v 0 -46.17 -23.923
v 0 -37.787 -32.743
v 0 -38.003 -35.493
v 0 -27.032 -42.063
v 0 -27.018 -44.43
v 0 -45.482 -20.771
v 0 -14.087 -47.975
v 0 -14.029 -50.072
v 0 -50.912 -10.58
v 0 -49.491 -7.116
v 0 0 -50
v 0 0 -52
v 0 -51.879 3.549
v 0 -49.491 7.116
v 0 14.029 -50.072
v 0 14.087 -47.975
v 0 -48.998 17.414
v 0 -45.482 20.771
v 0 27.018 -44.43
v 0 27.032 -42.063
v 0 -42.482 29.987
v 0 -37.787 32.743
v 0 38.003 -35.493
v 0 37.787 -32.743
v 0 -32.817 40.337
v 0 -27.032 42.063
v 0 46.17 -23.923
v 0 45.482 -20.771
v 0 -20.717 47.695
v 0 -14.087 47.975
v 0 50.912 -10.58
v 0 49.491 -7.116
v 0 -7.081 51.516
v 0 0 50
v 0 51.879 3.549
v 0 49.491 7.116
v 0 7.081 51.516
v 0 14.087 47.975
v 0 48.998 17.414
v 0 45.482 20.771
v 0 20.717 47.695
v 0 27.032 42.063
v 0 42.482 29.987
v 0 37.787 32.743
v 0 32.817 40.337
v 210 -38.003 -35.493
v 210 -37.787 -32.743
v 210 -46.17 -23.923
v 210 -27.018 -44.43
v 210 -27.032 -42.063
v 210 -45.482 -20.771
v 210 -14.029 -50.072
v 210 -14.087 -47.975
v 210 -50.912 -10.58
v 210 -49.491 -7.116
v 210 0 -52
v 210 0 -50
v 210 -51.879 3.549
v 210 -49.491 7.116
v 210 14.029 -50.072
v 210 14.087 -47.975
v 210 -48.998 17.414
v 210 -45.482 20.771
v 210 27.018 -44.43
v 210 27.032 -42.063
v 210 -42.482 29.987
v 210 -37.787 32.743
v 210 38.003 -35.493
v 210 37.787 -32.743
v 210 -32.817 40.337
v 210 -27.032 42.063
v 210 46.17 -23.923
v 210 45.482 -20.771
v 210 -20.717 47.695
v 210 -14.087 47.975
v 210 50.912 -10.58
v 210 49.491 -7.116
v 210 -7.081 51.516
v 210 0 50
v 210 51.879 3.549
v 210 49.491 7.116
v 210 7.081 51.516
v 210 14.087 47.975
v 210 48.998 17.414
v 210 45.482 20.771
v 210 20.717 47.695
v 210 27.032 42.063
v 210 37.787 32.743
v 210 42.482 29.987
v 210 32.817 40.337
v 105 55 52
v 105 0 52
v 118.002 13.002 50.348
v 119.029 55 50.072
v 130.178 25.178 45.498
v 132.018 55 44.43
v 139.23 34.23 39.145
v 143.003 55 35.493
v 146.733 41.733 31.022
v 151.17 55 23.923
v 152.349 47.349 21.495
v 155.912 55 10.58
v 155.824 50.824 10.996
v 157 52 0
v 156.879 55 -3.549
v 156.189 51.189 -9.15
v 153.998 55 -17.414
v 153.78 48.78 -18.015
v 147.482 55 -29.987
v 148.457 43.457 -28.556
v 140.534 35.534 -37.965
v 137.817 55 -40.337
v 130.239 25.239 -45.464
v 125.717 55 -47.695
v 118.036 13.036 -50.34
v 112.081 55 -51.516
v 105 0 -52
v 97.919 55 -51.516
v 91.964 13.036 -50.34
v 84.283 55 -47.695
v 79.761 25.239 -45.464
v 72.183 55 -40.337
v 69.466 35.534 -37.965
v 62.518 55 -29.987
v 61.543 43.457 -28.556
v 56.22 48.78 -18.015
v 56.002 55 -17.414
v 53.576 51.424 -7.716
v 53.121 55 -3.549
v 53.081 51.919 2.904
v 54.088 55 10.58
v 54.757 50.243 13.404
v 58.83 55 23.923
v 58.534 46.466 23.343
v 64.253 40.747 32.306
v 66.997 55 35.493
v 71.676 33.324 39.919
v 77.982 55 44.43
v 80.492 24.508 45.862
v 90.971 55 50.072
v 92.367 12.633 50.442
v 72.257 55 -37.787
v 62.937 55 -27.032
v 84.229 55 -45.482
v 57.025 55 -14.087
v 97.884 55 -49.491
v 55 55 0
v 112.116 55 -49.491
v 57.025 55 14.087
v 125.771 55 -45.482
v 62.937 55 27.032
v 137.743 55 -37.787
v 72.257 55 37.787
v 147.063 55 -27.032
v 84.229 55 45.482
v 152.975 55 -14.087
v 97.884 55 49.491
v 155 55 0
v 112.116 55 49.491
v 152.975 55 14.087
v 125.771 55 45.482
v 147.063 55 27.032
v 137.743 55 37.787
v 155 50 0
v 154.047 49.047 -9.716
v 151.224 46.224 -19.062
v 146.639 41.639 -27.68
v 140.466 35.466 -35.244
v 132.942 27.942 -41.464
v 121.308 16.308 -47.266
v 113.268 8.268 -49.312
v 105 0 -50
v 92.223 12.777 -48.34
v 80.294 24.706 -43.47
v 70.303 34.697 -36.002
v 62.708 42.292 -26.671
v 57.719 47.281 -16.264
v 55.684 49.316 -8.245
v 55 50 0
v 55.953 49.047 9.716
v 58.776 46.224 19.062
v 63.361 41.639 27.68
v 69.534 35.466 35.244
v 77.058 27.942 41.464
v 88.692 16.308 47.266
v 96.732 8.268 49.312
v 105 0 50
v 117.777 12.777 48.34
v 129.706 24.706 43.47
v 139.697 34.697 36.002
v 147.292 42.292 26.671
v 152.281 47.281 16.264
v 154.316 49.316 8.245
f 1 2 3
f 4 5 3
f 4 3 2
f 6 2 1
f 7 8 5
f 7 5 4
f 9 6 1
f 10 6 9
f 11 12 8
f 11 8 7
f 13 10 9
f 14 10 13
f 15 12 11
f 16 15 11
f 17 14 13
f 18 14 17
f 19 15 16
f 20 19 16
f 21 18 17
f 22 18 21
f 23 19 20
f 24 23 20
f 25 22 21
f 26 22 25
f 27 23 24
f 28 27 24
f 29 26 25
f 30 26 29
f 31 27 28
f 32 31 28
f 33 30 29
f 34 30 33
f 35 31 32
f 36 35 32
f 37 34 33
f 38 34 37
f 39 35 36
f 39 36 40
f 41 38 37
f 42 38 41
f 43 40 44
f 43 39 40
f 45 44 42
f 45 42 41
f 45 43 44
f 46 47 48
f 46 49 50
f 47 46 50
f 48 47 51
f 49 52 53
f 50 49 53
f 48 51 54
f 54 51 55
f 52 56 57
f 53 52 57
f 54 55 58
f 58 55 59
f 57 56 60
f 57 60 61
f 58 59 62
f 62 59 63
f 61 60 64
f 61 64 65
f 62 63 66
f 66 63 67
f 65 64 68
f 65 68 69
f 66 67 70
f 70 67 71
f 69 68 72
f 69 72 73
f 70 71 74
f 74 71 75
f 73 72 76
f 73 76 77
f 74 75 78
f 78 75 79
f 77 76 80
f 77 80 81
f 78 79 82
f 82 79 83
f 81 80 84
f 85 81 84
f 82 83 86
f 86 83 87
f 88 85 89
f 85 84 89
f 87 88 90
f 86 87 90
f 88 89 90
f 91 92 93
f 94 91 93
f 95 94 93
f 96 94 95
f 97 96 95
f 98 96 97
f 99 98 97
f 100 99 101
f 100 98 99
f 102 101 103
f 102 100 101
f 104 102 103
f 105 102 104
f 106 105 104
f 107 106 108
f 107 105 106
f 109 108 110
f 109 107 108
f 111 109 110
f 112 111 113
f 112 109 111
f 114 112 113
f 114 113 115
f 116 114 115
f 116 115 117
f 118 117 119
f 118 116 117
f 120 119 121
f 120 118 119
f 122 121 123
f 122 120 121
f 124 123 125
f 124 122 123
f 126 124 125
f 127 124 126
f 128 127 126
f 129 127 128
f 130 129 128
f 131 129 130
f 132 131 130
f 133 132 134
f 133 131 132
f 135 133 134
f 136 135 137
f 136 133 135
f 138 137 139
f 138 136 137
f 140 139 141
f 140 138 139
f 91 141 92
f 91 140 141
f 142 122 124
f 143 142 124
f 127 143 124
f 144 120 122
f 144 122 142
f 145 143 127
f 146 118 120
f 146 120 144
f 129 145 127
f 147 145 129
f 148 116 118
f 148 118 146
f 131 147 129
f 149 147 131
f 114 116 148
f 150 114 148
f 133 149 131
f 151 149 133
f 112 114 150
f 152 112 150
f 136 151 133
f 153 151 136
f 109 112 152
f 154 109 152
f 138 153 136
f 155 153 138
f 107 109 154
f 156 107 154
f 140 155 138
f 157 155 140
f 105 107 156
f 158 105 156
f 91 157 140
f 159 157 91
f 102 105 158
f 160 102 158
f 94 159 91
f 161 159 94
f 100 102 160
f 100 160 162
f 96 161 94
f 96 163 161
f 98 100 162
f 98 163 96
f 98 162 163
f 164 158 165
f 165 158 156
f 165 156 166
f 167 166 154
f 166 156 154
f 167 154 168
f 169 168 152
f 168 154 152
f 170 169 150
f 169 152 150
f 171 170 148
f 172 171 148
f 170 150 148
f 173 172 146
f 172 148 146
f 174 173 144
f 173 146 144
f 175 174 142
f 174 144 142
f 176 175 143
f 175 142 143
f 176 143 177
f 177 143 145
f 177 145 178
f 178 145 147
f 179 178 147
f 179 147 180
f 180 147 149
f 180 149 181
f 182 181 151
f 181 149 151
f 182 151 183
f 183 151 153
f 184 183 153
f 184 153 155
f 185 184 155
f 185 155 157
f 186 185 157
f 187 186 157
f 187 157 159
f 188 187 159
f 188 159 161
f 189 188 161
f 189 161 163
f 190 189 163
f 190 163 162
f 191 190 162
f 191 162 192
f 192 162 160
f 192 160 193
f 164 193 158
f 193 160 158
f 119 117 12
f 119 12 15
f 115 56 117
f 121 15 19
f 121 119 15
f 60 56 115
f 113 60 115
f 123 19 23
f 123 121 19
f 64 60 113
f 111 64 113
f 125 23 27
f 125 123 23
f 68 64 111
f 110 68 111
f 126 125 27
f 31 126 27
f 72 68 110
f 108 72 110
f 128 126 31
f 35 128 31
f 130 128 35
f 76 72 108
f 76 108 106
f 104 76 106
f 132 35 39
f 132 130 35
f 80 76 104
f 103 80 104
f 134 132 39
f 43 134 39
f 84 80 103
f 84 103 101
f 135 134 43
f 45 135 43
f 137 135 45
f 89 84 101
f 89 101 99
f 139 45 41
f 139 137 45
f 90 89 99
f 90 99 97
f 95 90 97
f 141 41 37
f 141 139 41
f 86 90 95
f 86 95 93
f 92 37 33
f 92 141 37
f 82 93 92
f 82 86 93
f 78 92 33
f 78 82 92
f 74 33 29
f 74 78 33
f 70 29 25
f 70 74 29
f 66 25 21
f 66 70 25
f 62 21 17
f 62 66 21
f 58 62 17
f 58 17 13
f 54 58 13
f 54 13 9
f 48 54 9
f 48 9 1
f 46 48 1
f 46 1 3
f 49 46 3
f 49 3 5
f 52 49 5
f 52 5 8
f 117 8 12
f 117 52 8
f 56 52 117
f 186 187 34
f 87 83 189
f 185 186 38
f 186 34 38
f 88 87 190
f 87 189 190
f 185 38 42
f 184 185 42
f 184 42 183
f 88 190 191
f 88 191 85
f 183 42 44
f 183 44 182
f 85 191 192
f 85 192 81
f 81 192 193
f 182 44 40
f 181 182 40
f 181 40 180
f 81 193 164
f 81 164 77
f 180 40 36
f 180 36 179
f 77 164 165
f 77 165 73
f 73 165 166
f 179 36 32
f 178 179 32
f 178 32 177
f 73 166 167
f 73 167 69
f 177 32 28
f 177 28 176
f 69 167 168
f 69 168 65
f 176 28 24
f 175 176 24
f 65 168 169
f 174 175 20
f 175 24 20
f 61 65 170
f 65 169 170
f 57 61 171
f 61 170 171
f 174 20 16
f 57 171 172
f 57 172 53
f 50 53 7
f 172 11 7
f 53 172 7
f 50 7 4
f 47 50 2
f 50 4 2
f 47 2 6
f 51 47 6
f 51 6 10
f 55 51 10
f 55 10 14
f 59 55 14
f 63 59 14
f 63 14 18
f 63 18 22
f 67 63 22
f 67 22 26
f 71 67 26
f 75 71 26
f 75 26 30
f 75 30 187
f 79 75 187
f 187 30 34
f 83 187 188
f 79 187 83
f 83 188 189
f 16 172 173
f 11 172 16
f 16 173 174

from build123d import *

# Parameters (mm, degrees)
SKETCH1_W                  = 210
SKETCH1_H                  = 52
SKETCH2_W                  = 52
SKETCH2_H                  = 55
M90_CLEARANCE_HOLE1_D      = 100
M90_CLEARANCE_HOLE2_REACH  = 243.357
M90_CLEARANCE_HOLE2_BORE_R = 50


with BuildPart() as part:
    # Sketch1 → Revolve1 (revolve)
    with BuildSketch(Plane.XY, mode=Mode.PRIVATE) as revolve1_sk:
        with Locations((105, 26)):
            Rectangle(SKETCH1_W, SKETCH1_H)
    revolve(revolve1_sk.sketch.rotate(Axis((0, 0, 0), (1, 0, 0)), 270), axis=Axis((0, 0, 0), (1, 0, 0)))

    # Sketch2 → Revolve2 (revolve)
    with BuildSketch(Plane.XY, mode=Mode.PRIVATE) as revolve2_sk:
        with Locations((79, 27.5)):
            Rectangle(SKETCH2_W, SKETCH2_H)
    revolve(revolve2_sk.sketch.rotate(Axis((105, 0, 0), (0, 1, 0)), 90), axis=Axis((105, 0, 0), (0, 1, 0)))

    # M90 Clearance Hole1 (through all)
    with Locations(Plane(origin=(210, 0, 0), x_dir=(0, 0, -1), z_dir=(1, 0, 0))):
        with Locations((0, 0)):
            Hole(M90_CLEARANCE_HOLE1_D / 2)

    # M90 Clearance Hole2 bore → M90 Clearance Hole2 (cut, up to next)
    with BuildSketch(Plane(origin=(0, 55, 0), x_dir=(1, 0, 0), z_dir=(0, 1, 0)), mode=Mode.PRIVATE) as m90_clearance_hole2_sk1:
        with Locations((105, 0)):
            Circle(M90_CLEARANCE_HOLE2_BORE_R)
    m90_clearance_hole2_tool1 = extrude(m90_clearance_hole2_sk1.sketch, amount=-M90_CLEARANCE_HOLE2_REACH, mode=Mode.PRIVATE) & part.part
    add(m90_clearance_hole2_tool1.solids().sort_by_distance((105, 55, 0))[0], mode=Mode.SUBTRACT)


solid = part.part
